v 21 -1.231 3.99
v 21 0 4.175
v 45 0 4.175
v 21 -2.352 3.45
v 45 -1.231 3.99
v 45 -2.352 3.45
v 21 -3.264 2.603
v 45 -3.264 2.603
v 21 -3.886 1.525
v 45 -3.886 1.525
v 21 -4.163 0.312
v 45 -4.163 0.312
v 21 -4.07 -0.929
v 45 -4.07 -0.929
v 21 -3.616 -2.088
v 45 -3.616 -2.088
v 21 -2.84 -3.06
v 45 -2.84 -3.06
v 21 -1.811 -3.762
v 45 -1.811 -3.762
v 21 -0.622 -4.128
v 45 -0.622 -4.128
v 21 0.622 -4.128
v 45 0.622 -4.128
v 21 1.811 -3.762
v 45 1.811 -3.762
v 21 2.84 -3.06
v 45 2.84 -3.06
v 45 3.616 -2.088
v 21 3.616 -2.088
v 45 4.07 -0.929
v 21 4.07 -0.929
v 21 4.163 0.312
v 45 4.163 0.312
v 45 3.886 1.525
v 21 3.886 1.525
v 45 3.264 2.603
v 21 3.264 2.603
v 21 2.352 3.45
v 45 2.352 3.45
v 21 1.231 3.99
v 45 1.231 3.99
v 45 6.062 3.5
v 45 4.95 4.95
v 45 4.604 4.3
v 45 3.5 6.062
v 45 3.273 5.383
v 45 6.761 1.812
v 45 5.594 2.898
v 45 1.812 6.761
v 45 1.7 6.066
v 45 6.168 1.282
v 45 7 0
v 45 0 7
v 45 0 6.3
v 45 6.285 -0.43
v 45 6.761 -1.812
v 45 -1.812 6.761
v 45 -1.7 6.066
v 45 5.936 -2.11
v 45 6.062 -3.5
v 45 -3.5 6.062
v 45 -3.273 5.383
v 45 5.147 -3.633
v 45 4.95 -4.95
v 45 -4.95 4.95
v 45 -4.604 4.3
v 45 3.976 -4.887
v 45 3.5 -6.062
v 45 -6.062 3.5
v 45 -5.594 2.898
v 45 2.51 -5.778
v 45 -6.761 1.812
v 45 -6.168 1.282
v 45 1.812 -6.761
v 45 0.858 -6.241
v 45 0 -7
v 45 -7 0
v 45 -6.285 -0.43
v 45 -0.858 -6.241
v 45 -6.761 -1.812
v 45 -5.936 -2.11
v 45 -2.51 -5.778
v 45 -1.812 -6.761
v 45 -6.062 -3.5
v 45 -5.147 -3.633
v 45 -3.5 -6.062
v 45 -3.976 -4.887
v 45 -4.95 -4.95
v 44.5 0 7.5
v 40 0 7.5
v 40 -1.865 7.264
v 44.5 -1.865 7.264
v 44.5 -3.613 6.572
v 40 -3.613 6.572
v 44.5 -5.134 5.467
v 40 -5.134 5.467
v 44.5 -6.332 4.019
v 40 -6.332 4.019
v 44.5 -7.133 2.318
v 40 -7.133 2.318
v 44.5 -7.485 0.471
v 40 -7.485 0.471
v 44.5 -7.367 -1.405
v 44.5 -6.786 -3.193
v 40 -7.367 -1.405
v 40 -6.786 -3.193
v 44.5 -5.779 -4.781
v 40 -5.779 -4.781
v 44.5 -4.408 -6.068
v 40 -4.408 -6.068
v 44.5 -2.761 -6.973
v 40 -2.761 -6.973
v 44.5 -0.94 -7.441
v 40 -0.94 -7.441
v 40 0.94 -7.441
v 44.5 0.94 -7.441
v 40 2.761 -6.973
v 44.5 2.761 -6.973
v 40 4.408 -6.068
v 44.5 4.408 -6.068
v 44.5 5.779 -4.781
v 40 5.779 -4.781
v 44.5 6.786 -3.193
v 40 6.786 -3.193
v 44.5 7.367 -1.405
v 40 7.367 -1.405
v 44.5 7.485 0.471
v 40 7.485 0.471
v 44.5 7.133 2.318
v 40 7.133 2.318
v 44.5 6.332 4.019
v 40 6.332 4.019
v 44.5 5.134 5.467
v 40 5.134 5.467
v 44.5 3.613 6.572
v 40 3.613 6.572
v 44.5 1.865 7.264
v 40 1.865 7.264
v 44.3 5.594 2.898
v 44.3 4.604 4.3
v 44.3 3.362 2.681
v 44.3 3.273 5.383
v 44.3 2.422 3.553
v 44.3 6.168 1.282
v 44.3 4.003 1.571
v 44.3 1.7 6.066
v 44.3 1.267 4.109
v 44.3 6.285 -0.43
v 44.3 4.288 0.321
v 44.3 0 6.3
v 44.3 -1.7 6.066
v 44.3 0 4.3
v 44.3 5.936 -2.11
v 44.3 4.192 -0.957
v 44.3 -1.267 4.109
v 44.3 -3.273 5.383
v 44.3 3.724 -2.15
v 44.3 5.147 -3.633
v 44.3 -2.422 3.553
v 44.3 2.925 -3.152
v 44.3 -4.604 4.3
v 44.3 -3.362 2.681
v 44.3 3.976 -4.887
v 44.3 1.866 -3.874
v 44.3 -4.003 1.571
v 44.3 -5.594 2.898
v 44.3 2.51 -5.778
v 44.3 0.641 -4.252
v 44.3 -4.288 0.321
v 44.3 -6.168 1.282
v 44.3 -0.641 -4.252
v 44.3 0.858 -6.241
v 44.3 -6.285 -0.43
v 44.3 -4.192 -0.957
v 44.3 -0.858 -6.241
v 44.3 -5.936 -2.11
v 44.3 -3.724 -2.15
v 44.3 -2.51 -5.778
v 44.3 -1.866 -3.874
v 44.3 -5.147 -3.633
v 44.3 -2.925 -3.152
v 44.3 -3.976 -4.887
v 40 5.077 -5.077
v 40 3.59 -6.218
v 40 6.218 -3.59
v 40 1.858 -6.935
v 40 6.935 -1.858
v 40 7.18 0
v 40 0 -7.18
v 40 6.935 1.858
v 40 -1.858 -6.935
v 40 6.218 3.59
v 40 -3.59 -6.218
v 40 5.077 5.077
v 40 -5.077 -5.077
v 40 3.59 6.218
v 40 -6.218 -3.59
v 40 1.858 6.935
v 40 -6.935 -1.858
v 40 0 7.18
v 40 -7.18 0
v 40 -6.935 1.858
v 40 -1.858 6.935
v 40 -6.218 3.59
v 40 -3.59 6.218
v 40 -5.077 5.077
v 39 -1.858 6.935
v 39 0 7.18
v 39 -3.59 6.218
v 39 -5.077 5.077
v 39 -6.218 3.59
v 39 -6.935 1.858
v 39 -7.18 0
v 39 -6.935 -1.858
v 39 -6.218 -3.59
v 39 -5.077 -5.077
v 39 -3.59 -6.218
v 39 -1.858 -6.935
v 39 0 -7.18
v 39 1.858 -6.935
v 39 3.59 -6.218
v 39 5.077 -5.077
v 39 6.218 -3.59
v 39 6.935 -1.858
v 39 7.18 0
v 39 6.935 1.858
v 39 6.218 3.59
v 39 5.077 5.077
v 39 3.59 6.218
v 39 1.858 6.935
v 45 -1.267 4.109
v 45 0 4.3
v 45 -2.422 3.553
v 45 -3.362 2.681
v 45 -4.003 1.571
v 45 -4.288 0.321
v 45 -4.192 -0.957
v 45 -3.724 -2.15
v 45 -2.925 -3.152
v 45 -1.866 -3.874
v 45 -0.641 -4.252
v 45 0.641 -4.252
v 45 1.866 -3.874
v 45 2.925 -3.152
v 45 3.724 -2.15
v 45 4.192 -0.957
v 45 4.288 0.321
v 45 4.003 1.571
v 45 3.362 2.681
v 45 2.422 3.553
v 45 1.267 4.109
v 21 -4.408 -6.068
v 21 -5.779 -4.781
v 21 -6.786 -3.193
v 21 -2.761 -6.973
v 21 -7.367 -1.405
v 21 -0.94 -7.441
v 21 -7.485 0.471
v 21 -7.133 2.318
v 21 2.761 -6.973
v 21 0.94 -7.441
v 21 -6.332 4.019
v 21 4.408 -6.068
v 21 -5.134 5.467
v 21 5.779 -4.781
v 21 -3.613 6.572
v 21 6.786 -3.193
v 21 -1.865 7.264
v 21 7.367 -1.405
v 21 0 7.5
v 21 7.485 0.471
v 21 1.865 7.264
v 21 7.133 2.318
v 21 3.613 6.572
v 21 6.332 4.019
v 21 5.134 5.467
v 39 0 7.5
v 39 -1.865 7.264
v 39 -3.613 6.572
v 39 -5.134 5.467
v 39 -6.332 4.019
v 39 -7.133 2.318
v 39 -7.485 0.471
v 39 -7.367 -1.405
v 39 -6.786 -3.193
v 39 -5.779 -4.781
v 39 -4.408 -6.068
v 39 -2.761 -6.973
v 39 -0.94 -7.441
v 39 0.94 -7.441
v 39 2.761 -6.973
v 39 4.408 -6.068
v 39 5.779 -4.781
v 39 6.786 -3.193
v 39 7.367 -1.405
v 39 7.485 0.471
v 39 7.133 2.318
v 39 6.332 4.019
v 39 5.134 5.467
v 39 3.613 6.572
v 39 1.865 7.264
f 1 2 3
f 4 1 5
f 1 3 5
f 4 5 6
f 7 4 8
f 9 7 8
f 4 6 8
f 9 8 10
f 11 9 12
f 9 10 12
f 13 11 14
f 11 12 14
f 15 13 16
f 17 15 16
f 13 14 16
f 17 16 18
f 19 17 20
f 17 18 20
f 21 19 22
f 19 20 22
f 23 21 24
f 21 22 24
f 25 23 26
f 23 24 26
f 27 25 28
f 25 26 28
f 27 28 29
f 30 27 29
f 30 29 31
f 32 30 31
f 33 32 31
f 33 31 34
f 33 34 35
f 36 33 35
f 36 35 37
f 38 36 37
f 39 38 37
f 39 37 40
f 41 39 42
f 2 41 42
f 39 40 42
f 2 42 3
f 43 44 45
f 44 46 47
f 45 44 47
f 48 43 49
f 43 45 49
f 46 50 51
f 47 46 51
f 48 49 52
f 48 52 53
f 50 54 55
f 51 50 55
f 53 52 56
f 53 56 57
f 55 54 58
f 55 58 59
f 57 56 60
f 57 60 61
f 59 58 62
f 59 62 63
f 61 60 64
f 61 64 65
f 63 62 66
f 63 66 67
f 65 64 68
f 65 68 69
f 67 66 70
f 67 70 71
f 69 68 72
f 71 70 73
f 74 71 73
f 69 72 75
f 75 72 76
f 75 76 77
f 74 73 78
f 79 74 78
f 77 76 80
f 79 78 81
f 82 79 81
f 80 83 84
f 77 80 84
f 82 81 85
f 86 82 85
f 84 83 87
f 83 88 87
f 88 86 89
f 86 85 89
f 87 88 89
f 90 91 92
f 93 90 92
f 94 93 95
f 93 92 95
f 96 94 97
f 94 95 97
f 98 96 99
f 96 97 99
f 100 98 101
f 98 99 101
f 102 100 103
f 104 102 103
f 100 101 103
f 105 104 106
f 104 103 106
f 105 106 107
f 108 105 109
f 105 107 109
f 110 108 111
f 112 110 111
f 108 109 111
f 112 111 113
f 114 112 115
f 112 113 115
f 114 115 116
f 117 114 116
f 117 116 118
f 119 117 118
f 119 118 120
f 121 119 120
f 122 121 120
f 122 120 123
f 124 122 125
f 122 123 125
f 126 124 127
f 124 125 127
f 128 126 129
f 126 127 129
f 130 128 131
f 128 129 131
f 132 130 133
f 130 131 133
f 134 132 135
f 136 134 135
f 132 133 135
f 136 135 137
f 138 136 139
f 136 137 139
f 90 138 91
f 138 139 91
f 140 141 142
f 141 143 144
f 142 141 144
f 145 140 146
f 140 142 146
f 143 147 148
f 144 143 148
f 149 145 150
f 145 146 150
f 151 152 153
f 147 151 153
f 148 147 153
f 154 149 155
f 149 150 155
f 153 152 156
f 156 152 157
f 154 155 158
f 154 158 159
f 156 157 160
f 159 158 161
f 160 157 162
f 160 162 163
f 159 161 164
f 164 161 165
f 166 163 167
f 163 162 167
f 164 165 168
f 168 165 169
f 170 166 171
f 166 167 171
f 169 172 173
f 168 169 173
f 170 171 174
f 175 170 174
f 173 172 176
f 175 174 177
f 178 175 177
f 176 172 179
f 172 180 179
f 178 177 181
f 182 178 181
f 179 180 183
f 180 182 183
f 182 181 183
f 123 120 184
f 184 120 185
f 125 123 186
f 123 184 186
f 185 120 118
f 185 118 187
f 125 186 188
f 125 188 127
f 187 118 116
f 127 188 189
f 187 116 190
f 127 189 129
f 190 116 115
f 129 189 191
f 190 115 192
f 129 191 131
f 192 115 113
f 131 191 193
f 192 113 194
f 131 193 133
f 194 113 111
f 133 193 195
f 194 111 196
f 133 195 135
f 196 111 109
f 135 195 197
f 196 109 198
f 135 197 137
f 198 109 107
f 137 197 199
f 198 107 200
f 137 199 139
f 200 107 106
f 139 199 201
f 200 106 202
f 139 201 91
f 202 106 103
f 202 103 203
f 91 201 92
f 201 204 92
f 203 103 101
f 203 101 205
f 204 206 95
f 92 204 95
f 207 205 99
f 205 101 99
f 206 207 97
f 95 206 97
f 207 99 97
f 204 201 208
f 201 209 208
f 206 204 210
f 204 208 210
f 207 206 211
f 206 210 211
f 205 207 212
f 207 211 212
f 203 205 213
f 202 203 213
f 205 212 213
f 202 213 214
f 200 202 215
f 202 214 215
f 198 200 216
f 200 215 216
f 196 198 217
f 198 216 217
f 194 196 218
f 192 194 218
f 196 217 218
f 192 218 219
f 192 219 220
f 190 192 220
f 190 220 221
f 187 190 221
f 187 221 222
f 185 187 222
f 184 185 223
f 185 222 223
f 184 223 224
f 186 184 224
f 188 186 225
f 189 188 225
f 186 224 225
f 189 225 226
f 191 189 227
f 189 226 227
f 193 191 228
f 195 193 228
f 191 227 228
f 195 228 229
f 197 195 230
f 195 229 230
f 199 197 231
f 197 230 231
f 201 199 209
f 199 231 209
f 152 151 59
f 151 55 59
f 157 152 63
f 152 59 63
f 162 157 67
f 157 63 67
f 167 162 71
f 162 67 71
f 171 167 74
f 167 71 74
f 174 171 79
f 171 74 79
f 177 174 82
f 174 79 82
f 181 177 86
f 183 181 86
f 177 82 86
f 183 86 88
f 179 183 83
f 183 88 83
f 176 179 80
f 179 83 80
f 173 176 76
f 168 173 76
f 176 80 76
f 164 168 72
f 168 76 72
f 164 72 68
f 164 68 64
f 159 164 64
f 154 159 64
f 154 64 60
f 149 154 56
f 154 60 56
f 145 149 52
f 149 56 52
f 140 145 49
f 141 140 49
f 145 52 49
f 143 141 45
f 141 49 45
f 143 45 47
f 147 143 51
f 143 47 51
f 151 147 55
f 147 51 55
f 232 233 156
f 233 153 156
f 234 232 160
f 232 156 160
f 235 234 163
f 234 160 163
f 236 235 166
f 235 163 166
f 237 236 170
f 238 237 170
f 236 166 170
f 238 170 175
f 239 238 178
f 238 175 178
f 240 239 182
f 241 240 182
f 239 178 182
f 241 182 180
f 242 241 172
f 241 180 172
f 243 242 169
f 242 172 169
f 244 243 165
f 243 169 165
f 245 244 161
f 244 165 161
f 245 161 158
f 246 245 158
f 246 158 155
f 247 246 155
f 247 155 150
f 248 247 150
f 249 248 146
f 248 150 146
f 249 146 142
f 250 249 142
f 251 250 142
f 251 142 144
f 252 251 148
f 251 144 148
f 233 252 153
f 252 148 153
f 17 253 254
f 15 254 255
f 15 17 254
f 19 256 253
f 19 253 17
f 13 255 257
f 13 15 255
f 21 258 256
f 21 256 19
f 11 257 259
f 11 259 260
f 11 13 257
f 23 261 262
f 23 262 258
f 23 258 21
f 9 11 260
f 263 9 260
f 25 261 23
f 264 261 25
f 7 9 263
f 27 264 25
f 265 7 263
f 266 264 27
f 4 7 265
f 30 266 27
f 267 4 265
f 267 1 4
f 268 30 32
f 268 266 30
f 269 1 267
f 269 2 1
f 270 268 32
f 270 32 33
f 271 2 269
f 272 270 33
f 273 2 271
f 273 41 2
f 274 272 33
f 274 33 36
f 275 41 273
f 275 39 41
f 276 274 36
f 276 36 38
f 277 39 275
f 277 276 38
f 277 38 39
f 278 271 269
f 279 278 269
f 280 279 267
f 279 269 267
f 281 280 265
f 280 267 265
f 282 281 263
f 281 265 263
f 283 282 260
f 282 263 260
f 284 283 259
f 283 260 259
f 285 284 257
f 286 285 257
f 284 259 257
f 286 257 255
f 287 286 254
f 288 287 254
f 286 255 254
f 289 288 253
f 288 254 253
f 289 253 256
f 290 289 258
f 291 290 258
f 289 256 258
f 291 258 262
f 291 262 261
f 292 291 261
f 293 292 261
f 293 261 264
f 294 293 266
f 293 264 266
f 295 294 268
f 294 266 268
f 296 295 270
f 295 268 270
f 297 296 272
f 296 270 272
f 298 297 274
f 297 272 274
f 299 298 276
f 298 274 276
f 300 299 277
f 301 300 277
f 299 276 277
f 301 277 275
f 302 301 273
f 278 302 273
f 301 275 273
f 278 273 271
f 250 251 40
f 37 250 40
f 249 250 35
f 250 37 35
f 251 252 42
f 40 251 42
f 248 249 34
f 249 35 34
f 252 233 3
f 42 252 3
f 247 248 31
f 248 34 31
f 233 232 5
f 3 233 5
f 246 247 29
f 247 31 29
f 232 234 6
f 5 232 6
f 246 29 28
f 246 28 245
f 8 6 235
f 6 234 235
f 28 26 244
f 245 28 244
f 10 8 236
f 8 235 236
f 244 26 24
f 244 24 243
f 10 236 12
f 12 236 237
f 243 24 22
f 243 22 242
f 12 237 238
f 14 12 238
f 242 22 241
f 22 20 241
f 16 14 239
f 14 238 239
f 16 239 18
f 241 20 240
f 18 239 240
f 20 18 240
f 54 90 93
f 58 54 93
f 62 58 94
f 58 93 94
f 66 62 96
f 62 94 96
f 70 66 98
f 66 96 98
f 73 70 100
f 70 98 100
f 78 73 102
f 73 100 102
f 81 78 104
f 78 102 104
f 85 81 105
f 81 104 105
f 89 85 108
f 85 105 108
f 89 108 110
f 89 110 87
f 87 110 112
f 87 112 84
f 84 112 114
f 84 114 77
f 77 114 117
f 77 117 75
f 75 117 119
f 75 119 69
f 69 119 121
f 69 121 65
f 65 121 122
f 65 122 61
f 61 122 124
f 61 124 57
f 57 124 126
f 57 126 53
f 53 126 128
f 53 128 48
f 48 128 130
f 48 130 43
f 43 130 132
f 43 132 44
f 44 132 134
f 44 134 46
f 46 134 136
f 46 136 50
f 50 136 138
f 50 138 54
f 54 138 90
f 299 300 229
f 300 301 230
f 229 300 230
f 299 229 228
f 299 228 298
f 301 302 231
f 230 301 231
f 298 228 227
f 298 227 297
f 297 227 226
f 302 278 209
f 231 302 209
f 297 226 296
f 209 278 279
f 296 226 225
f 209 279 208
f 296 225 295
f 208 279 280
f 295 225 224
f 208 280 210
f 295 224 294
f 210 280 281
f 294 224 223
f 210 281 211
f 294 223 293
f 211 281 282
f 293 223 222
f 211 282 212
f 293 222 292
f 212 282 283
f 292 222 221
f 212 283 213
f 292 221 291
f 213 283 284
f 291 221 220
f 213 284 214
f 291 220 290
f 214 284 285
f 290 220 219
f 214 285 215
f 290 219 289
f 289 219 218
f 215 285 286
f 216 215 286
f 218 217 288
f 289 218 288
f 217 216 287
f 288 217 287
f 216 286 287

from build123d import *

# Parameters (mm, degrees)
ZKOSEN_1_SIZE       = 0.5
SKETCH_1_R          = 8.79999935
CUT_EXTRUDE_1_DEPTH = 21


with BuildPart() as part:
    # Skica1 → Rotovat1 (revolve)
    with BuildSketch(Plane.XY, mode=Mode.PRIVATE) as rotovat1_sk:
        Polygon((0, 4.3), (0, 4.175), (45, 4.175), (45, 4.3), (44.3, 4.3), (44.3, 6.3), (45, 6.3), (45, 7.5), (40, 7.5), (40, 7.18), (39, 7.18), (39, 7.5), (6, 7.5), (6, 7.18), (5, 7.18), (5, 7.5), (0, 7.5), (0, 6.3), (0.7, 6.3), (0.7, 4.3), align=None)
    revolve(rotovat1_sk.sketch.rotate(Axis((0, 0, 0), (1, 0, 0)), 90), axis=Axis((0, 0, 0), (1, 0, 0)))

    # Zkosení1
    zkosen_1_edges = [part.edges().sort_by_distance(p)[0] for p in [
        (0, 0, -7.5),
        (45, 0, -7.5),
    ]]
    chamfer(zkosen_1_edges, length=ZKOSEN_1_SIZE)

    # 草图1 → 切除-拉伸1 (cut)
    with BuildSketch(Plane.ZY):
        Circle(SKETCH_1_R)
    extrude(amount=-CUT_EXTRUDE_1_DEPTH, mode=Mode.SUBTRACT)


solid = part.part
